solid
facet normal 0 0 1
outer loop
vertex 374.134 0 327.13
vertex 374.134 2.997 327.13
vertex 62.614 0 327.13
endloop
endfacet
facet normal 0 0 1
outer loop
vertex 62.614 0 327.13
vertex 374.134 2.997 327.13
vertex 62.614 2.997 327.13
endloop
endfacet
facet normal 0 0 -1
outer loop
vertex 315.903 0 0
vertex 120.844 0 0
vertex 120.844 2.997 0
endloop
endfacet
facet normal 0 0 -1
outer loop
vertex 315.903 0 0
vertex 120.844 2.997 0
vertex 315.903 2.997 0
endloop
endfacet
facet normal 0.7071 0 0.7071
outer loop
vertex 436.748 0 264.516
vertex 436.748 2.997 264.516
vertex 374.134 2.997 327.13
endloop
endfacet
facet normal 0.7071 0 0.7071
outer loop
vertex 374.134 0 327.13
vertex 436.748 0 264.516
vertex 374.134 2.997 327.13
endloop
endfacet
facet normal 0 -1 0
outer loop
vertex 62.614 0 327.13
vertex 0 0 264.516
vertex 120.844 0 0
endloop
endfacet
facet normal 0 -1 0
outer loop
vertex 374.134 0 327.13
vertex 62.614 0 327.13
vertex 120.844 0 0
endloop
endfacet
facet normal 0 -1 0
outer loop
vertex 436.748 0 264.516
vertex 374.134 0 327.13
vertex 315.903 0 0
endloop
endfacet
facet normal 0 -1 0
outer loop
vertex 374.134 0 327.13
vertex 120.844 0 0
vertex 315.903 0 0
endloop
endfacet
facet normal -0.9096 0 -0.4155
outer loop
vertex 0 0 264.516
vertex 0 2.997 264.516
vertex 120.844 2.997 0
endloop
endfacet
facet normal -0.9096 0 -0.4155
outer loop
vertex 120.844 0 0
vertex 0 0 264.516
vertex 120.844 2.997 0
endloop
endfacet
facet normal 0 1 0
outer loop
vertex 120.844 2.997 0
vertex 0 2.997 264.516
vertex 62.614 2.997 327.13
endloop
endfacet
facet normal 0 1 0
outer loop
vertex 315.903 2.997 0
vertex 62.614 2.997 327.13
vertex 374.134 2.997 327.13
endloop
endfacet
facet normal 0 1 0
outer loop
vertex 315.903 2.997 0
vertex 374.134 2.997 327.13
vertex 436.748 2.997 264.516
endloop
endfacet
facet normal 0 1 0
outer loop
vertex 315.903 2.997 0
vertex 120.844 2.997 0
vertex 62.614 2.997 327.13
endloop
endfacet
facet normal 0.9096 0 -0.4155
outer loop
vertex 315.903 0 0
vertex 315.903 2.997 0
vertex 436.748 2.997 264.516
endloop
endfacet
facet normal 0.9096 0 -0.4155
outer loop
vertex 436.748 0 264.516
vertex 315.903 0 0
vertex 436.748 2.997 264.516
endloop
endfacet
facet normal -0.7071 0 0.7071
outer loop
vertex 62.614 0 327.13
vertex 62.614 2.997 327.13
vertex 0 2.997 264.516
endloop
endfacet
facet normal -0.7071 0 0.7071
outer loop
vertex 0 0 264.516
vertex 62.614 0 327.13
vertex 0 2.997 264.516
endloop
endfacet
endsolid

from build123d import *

# Parameters (mm, degrees)
SKETCH1_W           = 500
SKETCH1_H           = 500
BOSS_EXTRUDE1_DEPTH = 2.9972
SKETCH2_OUTSIDE_W   = 643.422
SKETCH2_OUTSIDE_H   = 643.422
CUT_EXTRUDE1_DEPTH  = 708.113133245


with BuildPart() as part:
    # Sketch1 → Boss-Extrude1 (new body)
    with BuildSketch(Plane(origin=(0, 0, 0), x_dir=(1, 0, 0), z_dir=(0, 1, 0))):
        with Locations((250, -250)):
            Rectangle(SKETCH1_W, SKETCH1_H)
    extrude(amount=BOSS_EXTRUDE1_DEPTH)

    # Sketch2 outside → Cut-Extrude1 (cut, through all)
    with BuildSketch(Plane(origin=(0, 2.9972, 0), x_dir=(1, 0, 0), z_dir=(0, 1, 0))):
        with Locations((250, -250)):
            Rectangle(SKETCH2_OUTSIDE_W, SKETCH2_OUTSIDE_H)
        Polygon((315.903157035, 0), (436.747635081, -264.516499207), (374.133645972, -327.130488316), (62.613989109, -327.130488316), (0, -264.516499207), (120.844478046, 0), align=None, mode=Mode.SUBTRACT)
    extrude(amount=-CUT_EXTRUDE1_DEPTH, mode=Mode.SUBTRACT)


solid = part.part
